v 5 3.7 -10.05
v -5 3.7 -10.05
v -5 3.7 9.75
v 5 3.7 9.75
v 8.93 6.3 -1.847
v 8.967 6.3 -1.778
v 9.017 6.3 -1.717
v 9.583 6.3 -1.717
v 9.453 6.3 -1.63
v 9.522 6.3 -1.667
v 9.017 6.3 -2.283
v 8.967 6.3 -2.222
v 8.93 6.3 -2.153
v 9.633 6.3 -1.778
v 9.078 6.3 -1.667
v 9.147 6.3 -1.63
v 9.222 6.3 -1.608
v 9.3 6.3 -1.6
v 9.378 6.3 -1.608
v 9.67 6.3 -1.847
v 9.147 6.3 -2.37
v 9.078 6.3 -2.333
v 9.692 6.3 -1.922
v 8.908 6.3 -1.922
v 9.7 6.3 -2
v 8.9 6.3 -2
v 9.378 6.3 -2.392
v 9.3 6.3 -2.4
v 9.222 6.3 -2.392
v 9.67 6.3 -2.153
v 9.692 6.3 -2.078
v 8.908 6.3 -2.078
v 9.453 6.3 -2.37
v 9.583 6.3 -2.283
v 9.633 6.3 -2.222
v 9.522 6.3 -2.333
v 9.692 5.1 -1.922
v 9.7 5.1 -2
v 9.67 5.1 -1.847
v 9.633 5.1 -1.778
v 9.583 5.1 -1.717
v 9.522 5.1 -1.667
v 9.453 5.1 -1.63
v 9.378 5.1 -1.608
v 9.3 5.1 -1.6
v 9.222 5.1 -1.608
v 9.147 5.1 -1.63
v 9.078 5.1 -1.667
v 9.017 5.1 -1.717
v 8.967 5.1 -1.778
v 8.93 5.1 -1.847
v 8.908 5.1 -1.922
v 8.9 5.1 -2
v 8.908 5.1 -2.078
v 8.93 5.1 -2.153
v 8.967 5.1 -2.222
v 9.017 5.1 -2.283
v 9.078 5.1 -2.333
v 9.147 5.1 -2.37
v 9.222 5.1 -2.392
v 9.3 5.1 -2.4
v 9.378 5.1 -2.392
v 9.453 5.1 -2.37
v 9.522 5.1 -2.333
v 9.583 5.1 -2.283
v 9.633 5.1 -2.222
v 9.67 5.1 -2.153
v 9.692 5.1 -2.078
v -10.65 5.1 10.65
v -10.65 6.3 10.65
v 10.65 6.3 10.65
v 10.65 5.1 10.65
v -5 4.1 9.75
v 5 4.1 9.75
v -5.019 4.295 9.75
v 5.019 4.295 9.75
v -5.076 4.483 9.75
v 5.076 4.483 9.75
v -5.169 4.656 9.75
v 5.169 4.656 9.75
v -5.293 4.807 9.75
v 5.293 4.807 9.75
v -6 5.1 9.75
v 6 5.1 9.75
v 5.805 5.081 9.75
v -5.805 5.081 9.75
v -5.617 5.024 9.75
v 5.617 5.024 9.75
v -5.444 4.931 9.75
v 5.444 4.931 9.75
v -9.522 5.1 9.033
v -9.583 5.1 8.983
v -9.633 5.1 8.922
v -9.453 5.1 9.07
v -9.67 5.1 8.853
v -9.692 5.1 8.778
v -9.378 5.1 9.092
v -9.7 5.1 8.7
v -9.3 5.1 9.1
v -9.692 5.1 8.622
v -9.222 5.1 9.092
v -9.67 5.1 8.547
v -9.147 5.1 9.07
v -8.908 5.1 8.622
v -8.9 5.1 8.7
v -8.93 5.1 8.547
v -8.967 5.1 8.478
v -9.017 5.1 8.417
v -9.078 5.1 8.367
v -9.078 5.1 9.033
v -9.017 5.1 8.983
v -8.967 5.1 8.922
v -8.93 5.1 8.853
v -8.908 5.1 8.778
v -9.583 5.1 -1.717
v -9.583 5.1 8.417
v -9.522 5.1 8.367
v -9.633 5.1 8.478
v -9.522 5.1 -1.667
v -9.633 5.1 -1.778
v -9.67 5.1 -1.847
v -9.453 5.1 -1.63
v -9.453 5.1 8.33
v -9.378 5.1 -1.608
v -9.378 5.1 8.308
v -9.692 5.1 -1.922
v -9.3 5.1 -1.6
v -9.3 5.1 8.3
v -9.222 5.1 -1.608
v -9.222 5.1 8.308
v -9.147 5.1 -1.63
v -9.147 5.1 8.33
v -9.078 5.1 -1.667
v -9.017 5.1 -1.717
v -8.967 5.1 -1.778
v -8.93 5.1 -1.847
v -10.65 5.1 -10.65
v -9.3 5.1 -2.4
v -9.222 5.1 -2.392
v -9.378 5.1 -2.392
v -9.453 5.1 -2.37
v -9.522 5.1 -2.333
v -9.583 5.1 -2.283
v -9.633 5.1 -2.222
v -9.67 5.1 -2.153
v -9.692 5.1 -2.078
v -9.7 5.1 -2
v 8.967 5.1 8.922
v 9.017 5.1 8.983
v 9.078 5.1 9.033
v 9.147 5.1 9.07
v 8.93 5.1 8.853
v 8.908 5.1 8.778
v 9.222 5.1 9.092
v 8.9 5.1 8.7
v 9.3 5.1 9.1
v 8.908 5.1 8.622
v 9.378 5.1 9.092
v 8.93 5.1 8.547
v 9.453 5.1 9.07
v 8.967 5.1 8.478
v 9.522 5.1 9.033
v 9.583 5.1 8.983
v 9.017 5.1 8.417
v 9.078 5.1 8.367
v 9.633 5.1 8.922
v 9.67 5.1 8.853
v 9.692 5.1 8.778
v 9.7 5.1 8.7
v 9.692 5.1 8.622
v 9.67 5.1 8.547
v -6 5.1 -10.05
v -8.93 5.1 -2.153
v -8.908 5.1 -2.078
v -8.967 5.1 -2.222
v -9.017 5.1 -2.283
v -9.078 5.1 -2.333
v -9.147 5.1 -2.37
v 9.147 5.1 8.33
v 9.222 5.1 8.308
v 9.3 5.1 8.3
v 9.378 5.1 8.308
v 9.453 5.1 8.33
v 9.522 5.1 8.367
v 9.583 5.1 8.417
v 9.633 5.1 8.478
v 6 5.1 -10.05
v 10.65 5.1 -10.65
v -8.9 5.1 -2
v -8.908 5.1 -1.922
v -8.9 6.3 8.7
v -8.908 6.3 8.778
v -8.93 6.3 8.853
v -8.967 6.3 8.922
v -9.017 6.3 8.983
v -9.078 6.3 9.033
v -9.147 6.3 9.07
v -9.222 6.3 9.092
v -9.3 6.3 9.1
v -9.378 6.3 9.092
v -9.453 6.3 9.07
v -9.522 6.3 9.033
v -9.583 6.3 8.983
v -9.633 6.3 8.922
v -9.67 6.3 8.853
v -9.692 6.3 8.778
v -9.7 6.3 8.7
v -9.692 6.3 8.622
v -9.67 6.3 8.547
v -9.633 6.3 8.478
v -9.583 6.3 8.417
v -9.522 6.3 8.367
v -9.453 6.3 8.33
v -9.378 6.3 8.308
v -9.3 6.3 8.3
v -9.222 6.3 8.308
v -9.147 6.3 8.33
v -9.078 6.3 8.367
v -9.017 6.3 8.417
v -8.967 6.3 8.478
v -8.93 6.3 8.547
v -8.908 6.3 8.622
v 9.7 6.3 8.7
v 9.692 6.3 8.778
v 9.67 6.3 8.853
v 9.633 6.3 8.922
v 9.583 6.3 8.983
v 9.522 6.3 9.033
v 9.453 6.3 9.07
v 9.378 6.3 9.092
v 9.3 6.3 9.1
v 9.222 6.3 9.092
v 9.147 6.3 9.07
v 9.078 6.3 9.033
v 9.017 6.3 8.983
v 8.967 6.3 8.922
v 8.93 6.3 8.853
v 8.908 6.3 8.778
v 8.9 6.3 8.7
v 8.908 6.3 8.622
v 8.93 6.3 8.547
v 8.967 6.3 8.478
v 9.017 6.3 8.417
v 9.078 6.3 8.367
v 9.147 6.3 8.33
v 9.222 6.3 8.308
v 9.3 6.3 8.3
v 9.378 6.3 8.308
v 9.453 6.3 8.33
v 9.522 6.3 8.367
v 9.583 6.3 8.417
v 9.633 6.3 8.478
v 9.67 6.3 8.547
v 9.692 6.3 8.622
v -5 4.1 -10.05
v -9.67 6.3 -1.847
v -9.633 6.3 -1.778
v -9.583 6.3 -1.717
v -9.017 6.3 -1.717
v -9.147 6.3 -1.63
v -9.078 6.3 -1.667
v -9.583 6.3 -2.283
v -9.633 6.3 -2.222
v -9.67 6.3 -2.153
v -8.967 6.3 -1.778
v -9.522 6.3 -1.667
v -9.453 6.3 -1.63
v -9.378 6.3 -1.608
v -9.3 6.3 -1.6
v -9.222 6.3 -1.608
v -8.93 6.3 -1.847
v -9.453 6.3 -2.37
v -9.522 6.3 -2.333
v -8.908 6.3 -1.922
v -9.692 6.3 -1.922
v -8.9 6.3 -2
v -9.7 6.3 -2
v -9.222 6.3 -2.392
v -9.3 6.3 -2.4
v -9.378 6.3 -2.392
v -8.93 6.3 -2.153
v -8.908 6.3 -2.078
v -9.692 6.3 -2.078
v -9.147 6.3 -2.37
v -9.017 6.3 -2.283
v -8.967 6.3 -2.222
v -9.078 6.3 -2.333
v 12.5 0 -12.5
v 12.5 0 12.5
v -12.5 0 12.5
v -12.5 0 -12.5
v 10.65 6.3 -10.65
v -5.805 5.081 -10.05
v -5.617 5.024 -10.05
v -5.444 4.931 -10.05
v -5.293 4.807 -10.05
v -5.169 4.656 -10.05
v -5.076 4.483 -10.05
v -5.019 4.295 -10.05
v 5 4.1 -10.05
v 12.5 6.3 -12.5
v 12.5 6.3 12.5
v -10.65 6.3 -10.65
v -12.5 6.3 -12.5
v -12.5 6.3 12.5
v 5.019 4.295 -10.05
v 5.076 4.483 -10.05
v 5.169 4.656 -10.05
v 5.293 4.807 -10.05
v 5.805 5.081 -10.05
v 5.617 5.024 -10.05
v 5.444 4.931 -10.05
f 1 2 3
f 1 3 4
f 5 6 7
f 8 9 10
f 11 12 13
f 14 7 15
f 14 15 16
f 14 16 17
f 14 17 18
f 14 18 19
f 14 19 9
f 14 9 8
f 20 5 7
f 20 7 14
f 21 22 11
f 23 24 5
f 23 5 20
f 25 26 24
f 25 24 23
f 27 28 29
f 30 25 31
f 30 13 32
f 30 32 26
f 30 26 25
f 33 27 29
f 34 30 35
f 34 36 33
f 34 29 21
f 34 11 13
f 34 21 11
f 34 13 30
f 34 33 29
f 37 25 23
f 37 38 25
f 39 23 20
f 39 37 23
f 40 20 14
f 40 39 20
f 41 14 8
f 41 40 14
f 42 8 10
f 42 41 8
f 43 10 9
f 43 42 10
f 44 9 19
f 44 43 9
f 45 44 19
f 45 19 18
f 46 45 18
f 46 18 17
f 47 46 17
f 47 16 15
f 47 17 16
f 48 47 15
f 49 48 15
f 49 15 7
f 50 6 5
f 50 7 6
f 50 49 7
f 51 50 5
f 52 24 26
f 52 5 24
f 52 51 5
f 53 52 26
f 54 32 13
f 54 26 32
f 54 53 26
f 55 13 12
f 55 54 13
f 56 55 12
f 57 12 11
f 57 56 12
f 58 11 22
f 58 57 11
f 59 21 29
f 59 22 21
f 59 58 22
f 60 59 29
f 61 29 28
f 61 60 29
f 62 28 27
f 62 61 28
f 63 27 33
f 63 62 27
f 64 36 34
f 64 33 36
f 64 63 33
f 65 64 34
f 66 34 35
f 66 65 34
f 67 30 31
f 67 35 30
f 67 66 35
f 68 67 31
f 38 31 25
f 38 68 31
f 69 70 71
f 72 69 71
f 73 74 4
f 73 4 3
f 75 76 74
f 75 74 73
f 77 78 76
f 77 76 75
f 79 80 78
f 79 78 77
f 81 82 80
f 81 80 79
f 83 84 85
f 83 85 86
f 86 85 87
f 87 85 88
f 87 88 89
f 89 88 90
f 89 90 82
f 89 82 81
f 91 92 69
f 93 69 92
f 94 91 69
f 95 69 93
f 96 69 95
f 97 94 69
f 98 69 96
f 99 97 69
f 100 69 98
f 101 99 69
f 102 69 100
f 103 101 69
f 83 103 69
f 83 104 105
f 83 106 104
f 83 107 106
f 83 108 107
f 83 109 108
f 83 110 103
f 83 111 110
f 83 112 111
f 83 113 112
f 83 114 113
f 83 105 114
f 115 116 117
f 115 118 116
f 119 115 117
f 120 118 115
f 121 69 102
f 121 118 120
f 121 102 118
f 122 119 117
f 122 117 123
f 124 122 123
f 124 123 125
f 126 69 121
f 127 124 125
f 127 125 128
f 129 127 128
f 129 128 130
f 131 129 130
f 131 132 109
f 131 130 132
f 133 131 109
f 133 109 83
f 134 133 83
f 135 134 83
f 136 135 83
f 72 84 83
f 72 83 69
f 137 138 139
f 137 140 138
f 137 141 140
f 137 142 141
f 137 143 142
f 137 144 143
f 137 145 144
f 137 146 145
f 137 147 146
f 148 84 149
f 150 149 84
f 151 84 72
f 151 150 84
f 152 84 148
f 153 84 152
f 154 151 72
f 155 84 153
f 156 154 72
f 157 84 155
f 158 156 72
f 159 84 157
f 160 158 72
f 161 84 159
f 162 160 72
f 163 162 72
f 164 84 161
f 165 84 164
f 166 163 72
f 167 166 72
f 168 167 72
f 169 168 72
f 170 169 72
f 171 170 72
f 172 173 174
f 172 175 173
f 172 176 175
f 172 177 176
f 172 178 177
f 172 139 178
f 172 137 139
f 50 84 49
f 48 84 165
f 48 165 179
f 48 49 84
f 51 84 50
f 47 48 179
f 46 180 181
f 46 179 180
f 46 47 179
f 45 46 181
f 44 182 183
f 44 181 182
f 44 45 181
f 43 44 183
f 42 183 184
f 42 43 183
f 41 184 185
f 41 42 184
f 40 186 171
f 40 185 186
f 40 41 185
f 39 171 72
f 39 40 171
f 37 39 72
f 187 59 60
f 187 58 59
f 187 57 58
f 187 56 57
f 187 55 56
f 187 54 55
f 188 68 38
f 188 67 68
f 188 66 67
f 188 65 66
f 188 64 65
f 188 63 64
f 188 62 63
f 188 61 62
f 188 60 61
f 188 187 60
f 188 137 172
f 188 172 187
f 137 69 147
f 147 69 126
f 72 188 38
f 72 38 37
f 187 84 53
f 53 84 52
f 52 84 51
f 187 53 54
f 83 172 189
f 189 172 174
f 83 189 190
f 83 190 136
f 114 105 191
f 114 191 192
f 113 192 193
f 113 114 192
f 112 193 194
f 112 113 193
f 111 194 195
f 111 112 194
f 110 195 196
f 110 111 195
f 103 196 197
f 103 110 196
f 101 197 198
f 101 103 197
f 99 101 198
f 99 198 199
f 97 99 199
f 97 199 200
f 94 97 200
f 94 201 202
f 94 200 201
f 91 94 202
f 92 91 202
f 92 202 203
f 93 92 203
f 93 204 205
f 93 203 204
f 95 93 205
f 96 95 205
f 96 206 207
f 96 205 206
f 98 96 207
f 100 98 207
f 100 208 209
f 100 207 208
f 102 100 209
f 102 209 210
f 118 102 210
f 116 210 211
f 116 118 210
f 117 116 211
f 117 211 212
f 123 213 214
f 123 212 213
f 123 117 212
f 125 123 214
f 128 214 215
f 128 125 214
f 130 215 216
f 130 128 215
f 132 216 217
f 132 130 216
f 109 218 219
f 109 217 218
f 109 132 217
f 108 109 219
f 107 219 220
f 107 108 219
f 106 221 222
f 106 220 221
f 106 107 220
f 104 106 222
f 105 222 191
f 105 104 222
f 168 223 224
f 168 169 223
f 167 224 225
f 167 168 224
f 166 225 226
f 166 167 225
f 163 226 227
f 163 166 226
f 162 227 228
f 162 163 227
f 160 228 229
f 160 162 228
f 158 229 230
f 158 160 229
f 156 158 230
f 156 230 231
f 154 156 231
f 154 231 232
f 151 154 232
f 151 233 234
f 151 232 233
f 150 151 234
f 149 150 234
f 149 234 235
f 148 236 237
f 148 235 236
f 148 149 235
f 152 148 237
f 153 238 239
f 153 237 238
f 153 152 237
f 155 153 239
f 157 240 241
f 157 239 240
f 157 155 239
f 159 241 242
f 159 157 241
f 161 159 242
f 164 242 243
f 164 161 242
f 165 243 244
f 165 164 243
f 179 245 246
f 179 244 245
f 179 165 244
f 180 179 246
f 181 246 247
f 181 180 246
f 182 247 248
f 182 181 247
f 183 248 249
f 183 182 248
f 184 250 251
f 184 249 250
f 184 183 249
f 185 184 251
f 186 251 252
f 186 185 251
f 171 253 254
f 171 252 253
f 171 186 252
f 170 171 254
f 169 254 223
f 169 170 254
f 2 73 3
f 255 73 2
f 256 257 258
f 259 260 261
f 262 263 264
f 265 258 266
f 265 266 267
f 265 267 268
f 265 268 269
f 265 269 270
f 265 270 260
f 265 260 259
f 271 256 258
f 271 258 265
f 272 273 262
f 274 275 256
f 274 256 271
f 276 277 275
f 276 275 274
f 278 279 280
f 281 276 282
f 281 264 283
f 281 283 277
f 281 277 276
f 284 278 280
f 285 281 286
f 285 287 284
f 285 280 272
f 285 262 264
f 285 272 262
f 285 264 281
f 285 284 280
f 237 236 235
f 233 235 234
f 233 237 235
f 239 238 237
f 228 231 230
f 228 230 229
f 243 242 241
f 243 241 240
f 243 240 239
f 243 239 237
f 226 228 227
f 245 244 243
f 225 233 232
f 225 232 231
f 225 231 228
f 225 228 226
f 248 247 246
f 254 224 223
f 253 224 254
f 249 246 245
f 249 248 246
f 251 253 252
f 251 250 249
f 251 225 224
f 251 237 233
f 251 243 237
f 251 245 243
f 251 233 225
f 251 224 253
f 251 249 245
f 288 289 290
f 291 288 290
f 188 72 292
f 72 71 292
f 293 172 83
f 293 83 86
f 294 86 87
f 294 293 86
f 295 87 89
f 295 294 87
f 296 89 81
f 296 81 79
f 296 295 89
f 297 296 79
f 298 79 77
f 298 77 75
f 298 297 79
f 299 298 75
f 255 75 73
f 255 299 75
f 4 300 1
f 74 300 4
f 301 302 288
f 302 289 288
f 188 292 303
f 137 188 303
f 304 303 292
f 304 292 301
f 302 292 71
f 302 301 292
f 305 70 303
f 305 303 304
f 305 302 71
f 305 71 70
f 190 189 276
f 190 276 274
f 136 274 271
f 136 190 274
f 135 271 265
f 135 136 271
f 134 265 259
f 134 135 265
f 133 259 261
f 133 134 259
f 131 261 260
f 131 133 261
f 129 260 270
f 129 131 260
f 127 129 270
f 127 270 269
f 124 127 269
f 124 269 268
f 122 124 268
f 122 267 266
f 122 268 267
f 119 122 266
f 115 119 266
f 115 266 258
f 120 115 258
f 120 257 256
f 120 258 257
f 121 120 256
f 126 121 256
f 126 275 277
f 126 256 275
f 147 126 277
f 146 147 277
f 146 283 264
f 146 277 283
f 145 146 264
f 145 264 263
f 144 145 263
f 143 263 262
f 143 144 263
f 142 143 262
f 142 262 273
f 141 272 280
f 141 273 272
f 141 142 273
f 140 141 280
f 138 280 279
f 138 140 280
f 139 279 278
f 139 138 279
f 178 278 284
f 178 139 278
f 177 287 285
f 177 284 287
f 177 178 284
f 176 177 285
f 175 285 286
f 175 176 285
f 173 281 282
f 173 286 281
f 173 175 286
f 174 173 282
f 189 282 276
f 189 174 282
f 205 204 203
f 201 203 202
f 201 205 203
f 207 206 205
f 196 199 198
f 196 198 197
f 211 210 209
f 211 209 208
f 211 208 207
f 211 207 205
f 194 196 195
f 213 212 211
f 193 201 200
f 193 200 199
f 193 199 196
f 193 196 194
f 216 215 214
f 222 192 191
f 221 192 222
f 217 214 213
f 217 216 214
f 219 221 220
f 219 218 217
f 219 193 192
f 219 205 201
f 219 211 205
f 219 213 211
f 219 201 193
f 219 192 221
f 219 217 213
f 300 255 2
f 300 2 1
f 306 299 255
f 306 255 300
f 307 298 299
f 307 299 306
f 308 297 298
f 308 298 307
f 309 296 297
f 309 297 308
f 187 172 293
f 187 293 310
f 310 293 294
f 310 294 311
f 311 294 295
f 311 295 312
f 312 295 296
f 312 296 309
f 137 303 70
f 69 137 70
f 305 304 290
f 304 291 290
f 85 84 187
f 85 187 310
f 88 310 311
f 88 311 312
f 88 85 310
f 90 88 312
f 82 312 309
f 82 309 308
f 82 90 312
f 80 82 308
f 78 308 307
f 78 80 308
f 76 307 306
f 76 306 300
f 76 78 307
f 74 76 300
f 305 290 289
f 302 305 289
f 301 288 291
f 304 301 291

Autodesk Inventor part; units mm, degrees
ref_plane "YZ Plane" through (0, 0, 0) normal (1, 0, 0) x (0, 1, 0)
ref_plane "XZ Plane" through (0, 0, 0) normal (0, 1, 0) x (-1, 0, 0)
ref_plane "XY Plane" through (0, 0, 0) normal (0, 0, 1) x (1, 0, 0)
sketch "Эскиз1" plane through (0, 0, 0) normal (0, 1, 0) x (-1, 0, 0)
  line L0 (12.5, 12.5) -> (-12.5, 12.5)
  line L1 (-12.5, 12.5) -> (-12.5, -12.5)
  line L2 (-12.5, -12.5) -> (12.5, -12.5)
  line L3 (12.5, -12.5) -> (12.5, 12.5)
  line L4 (12.5, 12.5) -> (-12.5, -12.5) construction
  point P0 (0, 0)
  point P1 (0, 0)
  dimension "d0" = 25
  dimension "d1" = 25
extrude "Выдавливание1" add sketch "Эскиз1" along normal blind 6.3
sketch "Эскиз2" plane through (0, 6.3, 0) normal (0, 1, 0) x (1, 0, 0)
  line L0 (-10.65, -10.65) -> (10.65, -10.65)
  line L1 (10.65, -10.65) -> (10.65, 10.65)
  line L2 (10.65, 10.65) -> (-10.65, 10.65)
  line L3 (-10.65, 10.65) -> (-10.65, -10.65)
  line L4 (-10.65, -10.65) -> (10.65, 10.65) construction
  line L5 (10.65, -10.65) -> (-10.65, 10.65) construction
  line L6 (-12.5, 12.5) -> (-12.5, -12.5) projected
  point P0 (0, 0)
  dimension "d4" = 1.85
extrude "Выдавливание2" cut sketch "Эскиз2" against normal blind 1.2
sketch "Эскиз3" plane through (0, 5.1, 0) normal (0, 1, 0) x (1, 0, 0)
  line L0 (5, -9.75) -> (-5, -9.75)
  line L1 (-5, -9.75) -> (-5, 10.05)
  line L2 (-5, 10.05) -> (5, 10.05)
  line L3 (5, 10.05) -> (5, -9.75)
  line L4 (10.65, -10.65) -> (-10.65, -10.65) projected
  line L5 (0, -10.65) -> (0, 6.083) construction
  point P0 (0, 0)
  point P1 (0, -9.75)
  dimension "d7" = 10
  dimension "d8" = 19.8
  dimension "d9" = 0.9
extrude "Выдавливание3" cut sketch "Эскиз3" against normal blind 1.4
fillet "Сопряжение1" radius 1 2 edges at (-5, 5.1, -0.15) (5, 5.1, -0.15)
sketch "Эскиз6" plane through (0, 5.1, 0) normal (0, 1, 0) x (1, 0, 0)
  circle A0 centre (-9.3, 2) radius 0.4
  line L0 (-10.65, -10.65) -> (-10.65, 10.65) projected
  line L1 (-10.65, 10.65) -> (10.65, 10.65) projected
  circle A1 centre (-9.3, -8.7) radius 0.4
  line L2 (10.65, -10.65) -> (-10.65, -10.65) projected
  line L3 (0, -15.7072) -> (0, 17.6357) construction
  circle A2 centre (9.3, 2) radius 0.4
  circle A3 centre (9.3, -8.7) radius 0.4
  point P0 (0, 0)
  dimension "d21" = 0.8
  dimension "d22" = 1.35
  dimension "d23" = 8.65
  dimension "d24" = 0.8
  dimension "d25" = 1.35
  dimension "d26" = 1.55
extrude "Выдавливание6" add sketch "Эскиз6" along normal blind 1.2
sketch "Эскиз7" plane through (0, 3.7, 0) normal (0, 1, 0) x (1, 0, 0)
  circle A0 centre (0, -3.8434) radius 4
  point P0 (0, 0)
  dimension "d29" = 8
properties part number "Camera"
